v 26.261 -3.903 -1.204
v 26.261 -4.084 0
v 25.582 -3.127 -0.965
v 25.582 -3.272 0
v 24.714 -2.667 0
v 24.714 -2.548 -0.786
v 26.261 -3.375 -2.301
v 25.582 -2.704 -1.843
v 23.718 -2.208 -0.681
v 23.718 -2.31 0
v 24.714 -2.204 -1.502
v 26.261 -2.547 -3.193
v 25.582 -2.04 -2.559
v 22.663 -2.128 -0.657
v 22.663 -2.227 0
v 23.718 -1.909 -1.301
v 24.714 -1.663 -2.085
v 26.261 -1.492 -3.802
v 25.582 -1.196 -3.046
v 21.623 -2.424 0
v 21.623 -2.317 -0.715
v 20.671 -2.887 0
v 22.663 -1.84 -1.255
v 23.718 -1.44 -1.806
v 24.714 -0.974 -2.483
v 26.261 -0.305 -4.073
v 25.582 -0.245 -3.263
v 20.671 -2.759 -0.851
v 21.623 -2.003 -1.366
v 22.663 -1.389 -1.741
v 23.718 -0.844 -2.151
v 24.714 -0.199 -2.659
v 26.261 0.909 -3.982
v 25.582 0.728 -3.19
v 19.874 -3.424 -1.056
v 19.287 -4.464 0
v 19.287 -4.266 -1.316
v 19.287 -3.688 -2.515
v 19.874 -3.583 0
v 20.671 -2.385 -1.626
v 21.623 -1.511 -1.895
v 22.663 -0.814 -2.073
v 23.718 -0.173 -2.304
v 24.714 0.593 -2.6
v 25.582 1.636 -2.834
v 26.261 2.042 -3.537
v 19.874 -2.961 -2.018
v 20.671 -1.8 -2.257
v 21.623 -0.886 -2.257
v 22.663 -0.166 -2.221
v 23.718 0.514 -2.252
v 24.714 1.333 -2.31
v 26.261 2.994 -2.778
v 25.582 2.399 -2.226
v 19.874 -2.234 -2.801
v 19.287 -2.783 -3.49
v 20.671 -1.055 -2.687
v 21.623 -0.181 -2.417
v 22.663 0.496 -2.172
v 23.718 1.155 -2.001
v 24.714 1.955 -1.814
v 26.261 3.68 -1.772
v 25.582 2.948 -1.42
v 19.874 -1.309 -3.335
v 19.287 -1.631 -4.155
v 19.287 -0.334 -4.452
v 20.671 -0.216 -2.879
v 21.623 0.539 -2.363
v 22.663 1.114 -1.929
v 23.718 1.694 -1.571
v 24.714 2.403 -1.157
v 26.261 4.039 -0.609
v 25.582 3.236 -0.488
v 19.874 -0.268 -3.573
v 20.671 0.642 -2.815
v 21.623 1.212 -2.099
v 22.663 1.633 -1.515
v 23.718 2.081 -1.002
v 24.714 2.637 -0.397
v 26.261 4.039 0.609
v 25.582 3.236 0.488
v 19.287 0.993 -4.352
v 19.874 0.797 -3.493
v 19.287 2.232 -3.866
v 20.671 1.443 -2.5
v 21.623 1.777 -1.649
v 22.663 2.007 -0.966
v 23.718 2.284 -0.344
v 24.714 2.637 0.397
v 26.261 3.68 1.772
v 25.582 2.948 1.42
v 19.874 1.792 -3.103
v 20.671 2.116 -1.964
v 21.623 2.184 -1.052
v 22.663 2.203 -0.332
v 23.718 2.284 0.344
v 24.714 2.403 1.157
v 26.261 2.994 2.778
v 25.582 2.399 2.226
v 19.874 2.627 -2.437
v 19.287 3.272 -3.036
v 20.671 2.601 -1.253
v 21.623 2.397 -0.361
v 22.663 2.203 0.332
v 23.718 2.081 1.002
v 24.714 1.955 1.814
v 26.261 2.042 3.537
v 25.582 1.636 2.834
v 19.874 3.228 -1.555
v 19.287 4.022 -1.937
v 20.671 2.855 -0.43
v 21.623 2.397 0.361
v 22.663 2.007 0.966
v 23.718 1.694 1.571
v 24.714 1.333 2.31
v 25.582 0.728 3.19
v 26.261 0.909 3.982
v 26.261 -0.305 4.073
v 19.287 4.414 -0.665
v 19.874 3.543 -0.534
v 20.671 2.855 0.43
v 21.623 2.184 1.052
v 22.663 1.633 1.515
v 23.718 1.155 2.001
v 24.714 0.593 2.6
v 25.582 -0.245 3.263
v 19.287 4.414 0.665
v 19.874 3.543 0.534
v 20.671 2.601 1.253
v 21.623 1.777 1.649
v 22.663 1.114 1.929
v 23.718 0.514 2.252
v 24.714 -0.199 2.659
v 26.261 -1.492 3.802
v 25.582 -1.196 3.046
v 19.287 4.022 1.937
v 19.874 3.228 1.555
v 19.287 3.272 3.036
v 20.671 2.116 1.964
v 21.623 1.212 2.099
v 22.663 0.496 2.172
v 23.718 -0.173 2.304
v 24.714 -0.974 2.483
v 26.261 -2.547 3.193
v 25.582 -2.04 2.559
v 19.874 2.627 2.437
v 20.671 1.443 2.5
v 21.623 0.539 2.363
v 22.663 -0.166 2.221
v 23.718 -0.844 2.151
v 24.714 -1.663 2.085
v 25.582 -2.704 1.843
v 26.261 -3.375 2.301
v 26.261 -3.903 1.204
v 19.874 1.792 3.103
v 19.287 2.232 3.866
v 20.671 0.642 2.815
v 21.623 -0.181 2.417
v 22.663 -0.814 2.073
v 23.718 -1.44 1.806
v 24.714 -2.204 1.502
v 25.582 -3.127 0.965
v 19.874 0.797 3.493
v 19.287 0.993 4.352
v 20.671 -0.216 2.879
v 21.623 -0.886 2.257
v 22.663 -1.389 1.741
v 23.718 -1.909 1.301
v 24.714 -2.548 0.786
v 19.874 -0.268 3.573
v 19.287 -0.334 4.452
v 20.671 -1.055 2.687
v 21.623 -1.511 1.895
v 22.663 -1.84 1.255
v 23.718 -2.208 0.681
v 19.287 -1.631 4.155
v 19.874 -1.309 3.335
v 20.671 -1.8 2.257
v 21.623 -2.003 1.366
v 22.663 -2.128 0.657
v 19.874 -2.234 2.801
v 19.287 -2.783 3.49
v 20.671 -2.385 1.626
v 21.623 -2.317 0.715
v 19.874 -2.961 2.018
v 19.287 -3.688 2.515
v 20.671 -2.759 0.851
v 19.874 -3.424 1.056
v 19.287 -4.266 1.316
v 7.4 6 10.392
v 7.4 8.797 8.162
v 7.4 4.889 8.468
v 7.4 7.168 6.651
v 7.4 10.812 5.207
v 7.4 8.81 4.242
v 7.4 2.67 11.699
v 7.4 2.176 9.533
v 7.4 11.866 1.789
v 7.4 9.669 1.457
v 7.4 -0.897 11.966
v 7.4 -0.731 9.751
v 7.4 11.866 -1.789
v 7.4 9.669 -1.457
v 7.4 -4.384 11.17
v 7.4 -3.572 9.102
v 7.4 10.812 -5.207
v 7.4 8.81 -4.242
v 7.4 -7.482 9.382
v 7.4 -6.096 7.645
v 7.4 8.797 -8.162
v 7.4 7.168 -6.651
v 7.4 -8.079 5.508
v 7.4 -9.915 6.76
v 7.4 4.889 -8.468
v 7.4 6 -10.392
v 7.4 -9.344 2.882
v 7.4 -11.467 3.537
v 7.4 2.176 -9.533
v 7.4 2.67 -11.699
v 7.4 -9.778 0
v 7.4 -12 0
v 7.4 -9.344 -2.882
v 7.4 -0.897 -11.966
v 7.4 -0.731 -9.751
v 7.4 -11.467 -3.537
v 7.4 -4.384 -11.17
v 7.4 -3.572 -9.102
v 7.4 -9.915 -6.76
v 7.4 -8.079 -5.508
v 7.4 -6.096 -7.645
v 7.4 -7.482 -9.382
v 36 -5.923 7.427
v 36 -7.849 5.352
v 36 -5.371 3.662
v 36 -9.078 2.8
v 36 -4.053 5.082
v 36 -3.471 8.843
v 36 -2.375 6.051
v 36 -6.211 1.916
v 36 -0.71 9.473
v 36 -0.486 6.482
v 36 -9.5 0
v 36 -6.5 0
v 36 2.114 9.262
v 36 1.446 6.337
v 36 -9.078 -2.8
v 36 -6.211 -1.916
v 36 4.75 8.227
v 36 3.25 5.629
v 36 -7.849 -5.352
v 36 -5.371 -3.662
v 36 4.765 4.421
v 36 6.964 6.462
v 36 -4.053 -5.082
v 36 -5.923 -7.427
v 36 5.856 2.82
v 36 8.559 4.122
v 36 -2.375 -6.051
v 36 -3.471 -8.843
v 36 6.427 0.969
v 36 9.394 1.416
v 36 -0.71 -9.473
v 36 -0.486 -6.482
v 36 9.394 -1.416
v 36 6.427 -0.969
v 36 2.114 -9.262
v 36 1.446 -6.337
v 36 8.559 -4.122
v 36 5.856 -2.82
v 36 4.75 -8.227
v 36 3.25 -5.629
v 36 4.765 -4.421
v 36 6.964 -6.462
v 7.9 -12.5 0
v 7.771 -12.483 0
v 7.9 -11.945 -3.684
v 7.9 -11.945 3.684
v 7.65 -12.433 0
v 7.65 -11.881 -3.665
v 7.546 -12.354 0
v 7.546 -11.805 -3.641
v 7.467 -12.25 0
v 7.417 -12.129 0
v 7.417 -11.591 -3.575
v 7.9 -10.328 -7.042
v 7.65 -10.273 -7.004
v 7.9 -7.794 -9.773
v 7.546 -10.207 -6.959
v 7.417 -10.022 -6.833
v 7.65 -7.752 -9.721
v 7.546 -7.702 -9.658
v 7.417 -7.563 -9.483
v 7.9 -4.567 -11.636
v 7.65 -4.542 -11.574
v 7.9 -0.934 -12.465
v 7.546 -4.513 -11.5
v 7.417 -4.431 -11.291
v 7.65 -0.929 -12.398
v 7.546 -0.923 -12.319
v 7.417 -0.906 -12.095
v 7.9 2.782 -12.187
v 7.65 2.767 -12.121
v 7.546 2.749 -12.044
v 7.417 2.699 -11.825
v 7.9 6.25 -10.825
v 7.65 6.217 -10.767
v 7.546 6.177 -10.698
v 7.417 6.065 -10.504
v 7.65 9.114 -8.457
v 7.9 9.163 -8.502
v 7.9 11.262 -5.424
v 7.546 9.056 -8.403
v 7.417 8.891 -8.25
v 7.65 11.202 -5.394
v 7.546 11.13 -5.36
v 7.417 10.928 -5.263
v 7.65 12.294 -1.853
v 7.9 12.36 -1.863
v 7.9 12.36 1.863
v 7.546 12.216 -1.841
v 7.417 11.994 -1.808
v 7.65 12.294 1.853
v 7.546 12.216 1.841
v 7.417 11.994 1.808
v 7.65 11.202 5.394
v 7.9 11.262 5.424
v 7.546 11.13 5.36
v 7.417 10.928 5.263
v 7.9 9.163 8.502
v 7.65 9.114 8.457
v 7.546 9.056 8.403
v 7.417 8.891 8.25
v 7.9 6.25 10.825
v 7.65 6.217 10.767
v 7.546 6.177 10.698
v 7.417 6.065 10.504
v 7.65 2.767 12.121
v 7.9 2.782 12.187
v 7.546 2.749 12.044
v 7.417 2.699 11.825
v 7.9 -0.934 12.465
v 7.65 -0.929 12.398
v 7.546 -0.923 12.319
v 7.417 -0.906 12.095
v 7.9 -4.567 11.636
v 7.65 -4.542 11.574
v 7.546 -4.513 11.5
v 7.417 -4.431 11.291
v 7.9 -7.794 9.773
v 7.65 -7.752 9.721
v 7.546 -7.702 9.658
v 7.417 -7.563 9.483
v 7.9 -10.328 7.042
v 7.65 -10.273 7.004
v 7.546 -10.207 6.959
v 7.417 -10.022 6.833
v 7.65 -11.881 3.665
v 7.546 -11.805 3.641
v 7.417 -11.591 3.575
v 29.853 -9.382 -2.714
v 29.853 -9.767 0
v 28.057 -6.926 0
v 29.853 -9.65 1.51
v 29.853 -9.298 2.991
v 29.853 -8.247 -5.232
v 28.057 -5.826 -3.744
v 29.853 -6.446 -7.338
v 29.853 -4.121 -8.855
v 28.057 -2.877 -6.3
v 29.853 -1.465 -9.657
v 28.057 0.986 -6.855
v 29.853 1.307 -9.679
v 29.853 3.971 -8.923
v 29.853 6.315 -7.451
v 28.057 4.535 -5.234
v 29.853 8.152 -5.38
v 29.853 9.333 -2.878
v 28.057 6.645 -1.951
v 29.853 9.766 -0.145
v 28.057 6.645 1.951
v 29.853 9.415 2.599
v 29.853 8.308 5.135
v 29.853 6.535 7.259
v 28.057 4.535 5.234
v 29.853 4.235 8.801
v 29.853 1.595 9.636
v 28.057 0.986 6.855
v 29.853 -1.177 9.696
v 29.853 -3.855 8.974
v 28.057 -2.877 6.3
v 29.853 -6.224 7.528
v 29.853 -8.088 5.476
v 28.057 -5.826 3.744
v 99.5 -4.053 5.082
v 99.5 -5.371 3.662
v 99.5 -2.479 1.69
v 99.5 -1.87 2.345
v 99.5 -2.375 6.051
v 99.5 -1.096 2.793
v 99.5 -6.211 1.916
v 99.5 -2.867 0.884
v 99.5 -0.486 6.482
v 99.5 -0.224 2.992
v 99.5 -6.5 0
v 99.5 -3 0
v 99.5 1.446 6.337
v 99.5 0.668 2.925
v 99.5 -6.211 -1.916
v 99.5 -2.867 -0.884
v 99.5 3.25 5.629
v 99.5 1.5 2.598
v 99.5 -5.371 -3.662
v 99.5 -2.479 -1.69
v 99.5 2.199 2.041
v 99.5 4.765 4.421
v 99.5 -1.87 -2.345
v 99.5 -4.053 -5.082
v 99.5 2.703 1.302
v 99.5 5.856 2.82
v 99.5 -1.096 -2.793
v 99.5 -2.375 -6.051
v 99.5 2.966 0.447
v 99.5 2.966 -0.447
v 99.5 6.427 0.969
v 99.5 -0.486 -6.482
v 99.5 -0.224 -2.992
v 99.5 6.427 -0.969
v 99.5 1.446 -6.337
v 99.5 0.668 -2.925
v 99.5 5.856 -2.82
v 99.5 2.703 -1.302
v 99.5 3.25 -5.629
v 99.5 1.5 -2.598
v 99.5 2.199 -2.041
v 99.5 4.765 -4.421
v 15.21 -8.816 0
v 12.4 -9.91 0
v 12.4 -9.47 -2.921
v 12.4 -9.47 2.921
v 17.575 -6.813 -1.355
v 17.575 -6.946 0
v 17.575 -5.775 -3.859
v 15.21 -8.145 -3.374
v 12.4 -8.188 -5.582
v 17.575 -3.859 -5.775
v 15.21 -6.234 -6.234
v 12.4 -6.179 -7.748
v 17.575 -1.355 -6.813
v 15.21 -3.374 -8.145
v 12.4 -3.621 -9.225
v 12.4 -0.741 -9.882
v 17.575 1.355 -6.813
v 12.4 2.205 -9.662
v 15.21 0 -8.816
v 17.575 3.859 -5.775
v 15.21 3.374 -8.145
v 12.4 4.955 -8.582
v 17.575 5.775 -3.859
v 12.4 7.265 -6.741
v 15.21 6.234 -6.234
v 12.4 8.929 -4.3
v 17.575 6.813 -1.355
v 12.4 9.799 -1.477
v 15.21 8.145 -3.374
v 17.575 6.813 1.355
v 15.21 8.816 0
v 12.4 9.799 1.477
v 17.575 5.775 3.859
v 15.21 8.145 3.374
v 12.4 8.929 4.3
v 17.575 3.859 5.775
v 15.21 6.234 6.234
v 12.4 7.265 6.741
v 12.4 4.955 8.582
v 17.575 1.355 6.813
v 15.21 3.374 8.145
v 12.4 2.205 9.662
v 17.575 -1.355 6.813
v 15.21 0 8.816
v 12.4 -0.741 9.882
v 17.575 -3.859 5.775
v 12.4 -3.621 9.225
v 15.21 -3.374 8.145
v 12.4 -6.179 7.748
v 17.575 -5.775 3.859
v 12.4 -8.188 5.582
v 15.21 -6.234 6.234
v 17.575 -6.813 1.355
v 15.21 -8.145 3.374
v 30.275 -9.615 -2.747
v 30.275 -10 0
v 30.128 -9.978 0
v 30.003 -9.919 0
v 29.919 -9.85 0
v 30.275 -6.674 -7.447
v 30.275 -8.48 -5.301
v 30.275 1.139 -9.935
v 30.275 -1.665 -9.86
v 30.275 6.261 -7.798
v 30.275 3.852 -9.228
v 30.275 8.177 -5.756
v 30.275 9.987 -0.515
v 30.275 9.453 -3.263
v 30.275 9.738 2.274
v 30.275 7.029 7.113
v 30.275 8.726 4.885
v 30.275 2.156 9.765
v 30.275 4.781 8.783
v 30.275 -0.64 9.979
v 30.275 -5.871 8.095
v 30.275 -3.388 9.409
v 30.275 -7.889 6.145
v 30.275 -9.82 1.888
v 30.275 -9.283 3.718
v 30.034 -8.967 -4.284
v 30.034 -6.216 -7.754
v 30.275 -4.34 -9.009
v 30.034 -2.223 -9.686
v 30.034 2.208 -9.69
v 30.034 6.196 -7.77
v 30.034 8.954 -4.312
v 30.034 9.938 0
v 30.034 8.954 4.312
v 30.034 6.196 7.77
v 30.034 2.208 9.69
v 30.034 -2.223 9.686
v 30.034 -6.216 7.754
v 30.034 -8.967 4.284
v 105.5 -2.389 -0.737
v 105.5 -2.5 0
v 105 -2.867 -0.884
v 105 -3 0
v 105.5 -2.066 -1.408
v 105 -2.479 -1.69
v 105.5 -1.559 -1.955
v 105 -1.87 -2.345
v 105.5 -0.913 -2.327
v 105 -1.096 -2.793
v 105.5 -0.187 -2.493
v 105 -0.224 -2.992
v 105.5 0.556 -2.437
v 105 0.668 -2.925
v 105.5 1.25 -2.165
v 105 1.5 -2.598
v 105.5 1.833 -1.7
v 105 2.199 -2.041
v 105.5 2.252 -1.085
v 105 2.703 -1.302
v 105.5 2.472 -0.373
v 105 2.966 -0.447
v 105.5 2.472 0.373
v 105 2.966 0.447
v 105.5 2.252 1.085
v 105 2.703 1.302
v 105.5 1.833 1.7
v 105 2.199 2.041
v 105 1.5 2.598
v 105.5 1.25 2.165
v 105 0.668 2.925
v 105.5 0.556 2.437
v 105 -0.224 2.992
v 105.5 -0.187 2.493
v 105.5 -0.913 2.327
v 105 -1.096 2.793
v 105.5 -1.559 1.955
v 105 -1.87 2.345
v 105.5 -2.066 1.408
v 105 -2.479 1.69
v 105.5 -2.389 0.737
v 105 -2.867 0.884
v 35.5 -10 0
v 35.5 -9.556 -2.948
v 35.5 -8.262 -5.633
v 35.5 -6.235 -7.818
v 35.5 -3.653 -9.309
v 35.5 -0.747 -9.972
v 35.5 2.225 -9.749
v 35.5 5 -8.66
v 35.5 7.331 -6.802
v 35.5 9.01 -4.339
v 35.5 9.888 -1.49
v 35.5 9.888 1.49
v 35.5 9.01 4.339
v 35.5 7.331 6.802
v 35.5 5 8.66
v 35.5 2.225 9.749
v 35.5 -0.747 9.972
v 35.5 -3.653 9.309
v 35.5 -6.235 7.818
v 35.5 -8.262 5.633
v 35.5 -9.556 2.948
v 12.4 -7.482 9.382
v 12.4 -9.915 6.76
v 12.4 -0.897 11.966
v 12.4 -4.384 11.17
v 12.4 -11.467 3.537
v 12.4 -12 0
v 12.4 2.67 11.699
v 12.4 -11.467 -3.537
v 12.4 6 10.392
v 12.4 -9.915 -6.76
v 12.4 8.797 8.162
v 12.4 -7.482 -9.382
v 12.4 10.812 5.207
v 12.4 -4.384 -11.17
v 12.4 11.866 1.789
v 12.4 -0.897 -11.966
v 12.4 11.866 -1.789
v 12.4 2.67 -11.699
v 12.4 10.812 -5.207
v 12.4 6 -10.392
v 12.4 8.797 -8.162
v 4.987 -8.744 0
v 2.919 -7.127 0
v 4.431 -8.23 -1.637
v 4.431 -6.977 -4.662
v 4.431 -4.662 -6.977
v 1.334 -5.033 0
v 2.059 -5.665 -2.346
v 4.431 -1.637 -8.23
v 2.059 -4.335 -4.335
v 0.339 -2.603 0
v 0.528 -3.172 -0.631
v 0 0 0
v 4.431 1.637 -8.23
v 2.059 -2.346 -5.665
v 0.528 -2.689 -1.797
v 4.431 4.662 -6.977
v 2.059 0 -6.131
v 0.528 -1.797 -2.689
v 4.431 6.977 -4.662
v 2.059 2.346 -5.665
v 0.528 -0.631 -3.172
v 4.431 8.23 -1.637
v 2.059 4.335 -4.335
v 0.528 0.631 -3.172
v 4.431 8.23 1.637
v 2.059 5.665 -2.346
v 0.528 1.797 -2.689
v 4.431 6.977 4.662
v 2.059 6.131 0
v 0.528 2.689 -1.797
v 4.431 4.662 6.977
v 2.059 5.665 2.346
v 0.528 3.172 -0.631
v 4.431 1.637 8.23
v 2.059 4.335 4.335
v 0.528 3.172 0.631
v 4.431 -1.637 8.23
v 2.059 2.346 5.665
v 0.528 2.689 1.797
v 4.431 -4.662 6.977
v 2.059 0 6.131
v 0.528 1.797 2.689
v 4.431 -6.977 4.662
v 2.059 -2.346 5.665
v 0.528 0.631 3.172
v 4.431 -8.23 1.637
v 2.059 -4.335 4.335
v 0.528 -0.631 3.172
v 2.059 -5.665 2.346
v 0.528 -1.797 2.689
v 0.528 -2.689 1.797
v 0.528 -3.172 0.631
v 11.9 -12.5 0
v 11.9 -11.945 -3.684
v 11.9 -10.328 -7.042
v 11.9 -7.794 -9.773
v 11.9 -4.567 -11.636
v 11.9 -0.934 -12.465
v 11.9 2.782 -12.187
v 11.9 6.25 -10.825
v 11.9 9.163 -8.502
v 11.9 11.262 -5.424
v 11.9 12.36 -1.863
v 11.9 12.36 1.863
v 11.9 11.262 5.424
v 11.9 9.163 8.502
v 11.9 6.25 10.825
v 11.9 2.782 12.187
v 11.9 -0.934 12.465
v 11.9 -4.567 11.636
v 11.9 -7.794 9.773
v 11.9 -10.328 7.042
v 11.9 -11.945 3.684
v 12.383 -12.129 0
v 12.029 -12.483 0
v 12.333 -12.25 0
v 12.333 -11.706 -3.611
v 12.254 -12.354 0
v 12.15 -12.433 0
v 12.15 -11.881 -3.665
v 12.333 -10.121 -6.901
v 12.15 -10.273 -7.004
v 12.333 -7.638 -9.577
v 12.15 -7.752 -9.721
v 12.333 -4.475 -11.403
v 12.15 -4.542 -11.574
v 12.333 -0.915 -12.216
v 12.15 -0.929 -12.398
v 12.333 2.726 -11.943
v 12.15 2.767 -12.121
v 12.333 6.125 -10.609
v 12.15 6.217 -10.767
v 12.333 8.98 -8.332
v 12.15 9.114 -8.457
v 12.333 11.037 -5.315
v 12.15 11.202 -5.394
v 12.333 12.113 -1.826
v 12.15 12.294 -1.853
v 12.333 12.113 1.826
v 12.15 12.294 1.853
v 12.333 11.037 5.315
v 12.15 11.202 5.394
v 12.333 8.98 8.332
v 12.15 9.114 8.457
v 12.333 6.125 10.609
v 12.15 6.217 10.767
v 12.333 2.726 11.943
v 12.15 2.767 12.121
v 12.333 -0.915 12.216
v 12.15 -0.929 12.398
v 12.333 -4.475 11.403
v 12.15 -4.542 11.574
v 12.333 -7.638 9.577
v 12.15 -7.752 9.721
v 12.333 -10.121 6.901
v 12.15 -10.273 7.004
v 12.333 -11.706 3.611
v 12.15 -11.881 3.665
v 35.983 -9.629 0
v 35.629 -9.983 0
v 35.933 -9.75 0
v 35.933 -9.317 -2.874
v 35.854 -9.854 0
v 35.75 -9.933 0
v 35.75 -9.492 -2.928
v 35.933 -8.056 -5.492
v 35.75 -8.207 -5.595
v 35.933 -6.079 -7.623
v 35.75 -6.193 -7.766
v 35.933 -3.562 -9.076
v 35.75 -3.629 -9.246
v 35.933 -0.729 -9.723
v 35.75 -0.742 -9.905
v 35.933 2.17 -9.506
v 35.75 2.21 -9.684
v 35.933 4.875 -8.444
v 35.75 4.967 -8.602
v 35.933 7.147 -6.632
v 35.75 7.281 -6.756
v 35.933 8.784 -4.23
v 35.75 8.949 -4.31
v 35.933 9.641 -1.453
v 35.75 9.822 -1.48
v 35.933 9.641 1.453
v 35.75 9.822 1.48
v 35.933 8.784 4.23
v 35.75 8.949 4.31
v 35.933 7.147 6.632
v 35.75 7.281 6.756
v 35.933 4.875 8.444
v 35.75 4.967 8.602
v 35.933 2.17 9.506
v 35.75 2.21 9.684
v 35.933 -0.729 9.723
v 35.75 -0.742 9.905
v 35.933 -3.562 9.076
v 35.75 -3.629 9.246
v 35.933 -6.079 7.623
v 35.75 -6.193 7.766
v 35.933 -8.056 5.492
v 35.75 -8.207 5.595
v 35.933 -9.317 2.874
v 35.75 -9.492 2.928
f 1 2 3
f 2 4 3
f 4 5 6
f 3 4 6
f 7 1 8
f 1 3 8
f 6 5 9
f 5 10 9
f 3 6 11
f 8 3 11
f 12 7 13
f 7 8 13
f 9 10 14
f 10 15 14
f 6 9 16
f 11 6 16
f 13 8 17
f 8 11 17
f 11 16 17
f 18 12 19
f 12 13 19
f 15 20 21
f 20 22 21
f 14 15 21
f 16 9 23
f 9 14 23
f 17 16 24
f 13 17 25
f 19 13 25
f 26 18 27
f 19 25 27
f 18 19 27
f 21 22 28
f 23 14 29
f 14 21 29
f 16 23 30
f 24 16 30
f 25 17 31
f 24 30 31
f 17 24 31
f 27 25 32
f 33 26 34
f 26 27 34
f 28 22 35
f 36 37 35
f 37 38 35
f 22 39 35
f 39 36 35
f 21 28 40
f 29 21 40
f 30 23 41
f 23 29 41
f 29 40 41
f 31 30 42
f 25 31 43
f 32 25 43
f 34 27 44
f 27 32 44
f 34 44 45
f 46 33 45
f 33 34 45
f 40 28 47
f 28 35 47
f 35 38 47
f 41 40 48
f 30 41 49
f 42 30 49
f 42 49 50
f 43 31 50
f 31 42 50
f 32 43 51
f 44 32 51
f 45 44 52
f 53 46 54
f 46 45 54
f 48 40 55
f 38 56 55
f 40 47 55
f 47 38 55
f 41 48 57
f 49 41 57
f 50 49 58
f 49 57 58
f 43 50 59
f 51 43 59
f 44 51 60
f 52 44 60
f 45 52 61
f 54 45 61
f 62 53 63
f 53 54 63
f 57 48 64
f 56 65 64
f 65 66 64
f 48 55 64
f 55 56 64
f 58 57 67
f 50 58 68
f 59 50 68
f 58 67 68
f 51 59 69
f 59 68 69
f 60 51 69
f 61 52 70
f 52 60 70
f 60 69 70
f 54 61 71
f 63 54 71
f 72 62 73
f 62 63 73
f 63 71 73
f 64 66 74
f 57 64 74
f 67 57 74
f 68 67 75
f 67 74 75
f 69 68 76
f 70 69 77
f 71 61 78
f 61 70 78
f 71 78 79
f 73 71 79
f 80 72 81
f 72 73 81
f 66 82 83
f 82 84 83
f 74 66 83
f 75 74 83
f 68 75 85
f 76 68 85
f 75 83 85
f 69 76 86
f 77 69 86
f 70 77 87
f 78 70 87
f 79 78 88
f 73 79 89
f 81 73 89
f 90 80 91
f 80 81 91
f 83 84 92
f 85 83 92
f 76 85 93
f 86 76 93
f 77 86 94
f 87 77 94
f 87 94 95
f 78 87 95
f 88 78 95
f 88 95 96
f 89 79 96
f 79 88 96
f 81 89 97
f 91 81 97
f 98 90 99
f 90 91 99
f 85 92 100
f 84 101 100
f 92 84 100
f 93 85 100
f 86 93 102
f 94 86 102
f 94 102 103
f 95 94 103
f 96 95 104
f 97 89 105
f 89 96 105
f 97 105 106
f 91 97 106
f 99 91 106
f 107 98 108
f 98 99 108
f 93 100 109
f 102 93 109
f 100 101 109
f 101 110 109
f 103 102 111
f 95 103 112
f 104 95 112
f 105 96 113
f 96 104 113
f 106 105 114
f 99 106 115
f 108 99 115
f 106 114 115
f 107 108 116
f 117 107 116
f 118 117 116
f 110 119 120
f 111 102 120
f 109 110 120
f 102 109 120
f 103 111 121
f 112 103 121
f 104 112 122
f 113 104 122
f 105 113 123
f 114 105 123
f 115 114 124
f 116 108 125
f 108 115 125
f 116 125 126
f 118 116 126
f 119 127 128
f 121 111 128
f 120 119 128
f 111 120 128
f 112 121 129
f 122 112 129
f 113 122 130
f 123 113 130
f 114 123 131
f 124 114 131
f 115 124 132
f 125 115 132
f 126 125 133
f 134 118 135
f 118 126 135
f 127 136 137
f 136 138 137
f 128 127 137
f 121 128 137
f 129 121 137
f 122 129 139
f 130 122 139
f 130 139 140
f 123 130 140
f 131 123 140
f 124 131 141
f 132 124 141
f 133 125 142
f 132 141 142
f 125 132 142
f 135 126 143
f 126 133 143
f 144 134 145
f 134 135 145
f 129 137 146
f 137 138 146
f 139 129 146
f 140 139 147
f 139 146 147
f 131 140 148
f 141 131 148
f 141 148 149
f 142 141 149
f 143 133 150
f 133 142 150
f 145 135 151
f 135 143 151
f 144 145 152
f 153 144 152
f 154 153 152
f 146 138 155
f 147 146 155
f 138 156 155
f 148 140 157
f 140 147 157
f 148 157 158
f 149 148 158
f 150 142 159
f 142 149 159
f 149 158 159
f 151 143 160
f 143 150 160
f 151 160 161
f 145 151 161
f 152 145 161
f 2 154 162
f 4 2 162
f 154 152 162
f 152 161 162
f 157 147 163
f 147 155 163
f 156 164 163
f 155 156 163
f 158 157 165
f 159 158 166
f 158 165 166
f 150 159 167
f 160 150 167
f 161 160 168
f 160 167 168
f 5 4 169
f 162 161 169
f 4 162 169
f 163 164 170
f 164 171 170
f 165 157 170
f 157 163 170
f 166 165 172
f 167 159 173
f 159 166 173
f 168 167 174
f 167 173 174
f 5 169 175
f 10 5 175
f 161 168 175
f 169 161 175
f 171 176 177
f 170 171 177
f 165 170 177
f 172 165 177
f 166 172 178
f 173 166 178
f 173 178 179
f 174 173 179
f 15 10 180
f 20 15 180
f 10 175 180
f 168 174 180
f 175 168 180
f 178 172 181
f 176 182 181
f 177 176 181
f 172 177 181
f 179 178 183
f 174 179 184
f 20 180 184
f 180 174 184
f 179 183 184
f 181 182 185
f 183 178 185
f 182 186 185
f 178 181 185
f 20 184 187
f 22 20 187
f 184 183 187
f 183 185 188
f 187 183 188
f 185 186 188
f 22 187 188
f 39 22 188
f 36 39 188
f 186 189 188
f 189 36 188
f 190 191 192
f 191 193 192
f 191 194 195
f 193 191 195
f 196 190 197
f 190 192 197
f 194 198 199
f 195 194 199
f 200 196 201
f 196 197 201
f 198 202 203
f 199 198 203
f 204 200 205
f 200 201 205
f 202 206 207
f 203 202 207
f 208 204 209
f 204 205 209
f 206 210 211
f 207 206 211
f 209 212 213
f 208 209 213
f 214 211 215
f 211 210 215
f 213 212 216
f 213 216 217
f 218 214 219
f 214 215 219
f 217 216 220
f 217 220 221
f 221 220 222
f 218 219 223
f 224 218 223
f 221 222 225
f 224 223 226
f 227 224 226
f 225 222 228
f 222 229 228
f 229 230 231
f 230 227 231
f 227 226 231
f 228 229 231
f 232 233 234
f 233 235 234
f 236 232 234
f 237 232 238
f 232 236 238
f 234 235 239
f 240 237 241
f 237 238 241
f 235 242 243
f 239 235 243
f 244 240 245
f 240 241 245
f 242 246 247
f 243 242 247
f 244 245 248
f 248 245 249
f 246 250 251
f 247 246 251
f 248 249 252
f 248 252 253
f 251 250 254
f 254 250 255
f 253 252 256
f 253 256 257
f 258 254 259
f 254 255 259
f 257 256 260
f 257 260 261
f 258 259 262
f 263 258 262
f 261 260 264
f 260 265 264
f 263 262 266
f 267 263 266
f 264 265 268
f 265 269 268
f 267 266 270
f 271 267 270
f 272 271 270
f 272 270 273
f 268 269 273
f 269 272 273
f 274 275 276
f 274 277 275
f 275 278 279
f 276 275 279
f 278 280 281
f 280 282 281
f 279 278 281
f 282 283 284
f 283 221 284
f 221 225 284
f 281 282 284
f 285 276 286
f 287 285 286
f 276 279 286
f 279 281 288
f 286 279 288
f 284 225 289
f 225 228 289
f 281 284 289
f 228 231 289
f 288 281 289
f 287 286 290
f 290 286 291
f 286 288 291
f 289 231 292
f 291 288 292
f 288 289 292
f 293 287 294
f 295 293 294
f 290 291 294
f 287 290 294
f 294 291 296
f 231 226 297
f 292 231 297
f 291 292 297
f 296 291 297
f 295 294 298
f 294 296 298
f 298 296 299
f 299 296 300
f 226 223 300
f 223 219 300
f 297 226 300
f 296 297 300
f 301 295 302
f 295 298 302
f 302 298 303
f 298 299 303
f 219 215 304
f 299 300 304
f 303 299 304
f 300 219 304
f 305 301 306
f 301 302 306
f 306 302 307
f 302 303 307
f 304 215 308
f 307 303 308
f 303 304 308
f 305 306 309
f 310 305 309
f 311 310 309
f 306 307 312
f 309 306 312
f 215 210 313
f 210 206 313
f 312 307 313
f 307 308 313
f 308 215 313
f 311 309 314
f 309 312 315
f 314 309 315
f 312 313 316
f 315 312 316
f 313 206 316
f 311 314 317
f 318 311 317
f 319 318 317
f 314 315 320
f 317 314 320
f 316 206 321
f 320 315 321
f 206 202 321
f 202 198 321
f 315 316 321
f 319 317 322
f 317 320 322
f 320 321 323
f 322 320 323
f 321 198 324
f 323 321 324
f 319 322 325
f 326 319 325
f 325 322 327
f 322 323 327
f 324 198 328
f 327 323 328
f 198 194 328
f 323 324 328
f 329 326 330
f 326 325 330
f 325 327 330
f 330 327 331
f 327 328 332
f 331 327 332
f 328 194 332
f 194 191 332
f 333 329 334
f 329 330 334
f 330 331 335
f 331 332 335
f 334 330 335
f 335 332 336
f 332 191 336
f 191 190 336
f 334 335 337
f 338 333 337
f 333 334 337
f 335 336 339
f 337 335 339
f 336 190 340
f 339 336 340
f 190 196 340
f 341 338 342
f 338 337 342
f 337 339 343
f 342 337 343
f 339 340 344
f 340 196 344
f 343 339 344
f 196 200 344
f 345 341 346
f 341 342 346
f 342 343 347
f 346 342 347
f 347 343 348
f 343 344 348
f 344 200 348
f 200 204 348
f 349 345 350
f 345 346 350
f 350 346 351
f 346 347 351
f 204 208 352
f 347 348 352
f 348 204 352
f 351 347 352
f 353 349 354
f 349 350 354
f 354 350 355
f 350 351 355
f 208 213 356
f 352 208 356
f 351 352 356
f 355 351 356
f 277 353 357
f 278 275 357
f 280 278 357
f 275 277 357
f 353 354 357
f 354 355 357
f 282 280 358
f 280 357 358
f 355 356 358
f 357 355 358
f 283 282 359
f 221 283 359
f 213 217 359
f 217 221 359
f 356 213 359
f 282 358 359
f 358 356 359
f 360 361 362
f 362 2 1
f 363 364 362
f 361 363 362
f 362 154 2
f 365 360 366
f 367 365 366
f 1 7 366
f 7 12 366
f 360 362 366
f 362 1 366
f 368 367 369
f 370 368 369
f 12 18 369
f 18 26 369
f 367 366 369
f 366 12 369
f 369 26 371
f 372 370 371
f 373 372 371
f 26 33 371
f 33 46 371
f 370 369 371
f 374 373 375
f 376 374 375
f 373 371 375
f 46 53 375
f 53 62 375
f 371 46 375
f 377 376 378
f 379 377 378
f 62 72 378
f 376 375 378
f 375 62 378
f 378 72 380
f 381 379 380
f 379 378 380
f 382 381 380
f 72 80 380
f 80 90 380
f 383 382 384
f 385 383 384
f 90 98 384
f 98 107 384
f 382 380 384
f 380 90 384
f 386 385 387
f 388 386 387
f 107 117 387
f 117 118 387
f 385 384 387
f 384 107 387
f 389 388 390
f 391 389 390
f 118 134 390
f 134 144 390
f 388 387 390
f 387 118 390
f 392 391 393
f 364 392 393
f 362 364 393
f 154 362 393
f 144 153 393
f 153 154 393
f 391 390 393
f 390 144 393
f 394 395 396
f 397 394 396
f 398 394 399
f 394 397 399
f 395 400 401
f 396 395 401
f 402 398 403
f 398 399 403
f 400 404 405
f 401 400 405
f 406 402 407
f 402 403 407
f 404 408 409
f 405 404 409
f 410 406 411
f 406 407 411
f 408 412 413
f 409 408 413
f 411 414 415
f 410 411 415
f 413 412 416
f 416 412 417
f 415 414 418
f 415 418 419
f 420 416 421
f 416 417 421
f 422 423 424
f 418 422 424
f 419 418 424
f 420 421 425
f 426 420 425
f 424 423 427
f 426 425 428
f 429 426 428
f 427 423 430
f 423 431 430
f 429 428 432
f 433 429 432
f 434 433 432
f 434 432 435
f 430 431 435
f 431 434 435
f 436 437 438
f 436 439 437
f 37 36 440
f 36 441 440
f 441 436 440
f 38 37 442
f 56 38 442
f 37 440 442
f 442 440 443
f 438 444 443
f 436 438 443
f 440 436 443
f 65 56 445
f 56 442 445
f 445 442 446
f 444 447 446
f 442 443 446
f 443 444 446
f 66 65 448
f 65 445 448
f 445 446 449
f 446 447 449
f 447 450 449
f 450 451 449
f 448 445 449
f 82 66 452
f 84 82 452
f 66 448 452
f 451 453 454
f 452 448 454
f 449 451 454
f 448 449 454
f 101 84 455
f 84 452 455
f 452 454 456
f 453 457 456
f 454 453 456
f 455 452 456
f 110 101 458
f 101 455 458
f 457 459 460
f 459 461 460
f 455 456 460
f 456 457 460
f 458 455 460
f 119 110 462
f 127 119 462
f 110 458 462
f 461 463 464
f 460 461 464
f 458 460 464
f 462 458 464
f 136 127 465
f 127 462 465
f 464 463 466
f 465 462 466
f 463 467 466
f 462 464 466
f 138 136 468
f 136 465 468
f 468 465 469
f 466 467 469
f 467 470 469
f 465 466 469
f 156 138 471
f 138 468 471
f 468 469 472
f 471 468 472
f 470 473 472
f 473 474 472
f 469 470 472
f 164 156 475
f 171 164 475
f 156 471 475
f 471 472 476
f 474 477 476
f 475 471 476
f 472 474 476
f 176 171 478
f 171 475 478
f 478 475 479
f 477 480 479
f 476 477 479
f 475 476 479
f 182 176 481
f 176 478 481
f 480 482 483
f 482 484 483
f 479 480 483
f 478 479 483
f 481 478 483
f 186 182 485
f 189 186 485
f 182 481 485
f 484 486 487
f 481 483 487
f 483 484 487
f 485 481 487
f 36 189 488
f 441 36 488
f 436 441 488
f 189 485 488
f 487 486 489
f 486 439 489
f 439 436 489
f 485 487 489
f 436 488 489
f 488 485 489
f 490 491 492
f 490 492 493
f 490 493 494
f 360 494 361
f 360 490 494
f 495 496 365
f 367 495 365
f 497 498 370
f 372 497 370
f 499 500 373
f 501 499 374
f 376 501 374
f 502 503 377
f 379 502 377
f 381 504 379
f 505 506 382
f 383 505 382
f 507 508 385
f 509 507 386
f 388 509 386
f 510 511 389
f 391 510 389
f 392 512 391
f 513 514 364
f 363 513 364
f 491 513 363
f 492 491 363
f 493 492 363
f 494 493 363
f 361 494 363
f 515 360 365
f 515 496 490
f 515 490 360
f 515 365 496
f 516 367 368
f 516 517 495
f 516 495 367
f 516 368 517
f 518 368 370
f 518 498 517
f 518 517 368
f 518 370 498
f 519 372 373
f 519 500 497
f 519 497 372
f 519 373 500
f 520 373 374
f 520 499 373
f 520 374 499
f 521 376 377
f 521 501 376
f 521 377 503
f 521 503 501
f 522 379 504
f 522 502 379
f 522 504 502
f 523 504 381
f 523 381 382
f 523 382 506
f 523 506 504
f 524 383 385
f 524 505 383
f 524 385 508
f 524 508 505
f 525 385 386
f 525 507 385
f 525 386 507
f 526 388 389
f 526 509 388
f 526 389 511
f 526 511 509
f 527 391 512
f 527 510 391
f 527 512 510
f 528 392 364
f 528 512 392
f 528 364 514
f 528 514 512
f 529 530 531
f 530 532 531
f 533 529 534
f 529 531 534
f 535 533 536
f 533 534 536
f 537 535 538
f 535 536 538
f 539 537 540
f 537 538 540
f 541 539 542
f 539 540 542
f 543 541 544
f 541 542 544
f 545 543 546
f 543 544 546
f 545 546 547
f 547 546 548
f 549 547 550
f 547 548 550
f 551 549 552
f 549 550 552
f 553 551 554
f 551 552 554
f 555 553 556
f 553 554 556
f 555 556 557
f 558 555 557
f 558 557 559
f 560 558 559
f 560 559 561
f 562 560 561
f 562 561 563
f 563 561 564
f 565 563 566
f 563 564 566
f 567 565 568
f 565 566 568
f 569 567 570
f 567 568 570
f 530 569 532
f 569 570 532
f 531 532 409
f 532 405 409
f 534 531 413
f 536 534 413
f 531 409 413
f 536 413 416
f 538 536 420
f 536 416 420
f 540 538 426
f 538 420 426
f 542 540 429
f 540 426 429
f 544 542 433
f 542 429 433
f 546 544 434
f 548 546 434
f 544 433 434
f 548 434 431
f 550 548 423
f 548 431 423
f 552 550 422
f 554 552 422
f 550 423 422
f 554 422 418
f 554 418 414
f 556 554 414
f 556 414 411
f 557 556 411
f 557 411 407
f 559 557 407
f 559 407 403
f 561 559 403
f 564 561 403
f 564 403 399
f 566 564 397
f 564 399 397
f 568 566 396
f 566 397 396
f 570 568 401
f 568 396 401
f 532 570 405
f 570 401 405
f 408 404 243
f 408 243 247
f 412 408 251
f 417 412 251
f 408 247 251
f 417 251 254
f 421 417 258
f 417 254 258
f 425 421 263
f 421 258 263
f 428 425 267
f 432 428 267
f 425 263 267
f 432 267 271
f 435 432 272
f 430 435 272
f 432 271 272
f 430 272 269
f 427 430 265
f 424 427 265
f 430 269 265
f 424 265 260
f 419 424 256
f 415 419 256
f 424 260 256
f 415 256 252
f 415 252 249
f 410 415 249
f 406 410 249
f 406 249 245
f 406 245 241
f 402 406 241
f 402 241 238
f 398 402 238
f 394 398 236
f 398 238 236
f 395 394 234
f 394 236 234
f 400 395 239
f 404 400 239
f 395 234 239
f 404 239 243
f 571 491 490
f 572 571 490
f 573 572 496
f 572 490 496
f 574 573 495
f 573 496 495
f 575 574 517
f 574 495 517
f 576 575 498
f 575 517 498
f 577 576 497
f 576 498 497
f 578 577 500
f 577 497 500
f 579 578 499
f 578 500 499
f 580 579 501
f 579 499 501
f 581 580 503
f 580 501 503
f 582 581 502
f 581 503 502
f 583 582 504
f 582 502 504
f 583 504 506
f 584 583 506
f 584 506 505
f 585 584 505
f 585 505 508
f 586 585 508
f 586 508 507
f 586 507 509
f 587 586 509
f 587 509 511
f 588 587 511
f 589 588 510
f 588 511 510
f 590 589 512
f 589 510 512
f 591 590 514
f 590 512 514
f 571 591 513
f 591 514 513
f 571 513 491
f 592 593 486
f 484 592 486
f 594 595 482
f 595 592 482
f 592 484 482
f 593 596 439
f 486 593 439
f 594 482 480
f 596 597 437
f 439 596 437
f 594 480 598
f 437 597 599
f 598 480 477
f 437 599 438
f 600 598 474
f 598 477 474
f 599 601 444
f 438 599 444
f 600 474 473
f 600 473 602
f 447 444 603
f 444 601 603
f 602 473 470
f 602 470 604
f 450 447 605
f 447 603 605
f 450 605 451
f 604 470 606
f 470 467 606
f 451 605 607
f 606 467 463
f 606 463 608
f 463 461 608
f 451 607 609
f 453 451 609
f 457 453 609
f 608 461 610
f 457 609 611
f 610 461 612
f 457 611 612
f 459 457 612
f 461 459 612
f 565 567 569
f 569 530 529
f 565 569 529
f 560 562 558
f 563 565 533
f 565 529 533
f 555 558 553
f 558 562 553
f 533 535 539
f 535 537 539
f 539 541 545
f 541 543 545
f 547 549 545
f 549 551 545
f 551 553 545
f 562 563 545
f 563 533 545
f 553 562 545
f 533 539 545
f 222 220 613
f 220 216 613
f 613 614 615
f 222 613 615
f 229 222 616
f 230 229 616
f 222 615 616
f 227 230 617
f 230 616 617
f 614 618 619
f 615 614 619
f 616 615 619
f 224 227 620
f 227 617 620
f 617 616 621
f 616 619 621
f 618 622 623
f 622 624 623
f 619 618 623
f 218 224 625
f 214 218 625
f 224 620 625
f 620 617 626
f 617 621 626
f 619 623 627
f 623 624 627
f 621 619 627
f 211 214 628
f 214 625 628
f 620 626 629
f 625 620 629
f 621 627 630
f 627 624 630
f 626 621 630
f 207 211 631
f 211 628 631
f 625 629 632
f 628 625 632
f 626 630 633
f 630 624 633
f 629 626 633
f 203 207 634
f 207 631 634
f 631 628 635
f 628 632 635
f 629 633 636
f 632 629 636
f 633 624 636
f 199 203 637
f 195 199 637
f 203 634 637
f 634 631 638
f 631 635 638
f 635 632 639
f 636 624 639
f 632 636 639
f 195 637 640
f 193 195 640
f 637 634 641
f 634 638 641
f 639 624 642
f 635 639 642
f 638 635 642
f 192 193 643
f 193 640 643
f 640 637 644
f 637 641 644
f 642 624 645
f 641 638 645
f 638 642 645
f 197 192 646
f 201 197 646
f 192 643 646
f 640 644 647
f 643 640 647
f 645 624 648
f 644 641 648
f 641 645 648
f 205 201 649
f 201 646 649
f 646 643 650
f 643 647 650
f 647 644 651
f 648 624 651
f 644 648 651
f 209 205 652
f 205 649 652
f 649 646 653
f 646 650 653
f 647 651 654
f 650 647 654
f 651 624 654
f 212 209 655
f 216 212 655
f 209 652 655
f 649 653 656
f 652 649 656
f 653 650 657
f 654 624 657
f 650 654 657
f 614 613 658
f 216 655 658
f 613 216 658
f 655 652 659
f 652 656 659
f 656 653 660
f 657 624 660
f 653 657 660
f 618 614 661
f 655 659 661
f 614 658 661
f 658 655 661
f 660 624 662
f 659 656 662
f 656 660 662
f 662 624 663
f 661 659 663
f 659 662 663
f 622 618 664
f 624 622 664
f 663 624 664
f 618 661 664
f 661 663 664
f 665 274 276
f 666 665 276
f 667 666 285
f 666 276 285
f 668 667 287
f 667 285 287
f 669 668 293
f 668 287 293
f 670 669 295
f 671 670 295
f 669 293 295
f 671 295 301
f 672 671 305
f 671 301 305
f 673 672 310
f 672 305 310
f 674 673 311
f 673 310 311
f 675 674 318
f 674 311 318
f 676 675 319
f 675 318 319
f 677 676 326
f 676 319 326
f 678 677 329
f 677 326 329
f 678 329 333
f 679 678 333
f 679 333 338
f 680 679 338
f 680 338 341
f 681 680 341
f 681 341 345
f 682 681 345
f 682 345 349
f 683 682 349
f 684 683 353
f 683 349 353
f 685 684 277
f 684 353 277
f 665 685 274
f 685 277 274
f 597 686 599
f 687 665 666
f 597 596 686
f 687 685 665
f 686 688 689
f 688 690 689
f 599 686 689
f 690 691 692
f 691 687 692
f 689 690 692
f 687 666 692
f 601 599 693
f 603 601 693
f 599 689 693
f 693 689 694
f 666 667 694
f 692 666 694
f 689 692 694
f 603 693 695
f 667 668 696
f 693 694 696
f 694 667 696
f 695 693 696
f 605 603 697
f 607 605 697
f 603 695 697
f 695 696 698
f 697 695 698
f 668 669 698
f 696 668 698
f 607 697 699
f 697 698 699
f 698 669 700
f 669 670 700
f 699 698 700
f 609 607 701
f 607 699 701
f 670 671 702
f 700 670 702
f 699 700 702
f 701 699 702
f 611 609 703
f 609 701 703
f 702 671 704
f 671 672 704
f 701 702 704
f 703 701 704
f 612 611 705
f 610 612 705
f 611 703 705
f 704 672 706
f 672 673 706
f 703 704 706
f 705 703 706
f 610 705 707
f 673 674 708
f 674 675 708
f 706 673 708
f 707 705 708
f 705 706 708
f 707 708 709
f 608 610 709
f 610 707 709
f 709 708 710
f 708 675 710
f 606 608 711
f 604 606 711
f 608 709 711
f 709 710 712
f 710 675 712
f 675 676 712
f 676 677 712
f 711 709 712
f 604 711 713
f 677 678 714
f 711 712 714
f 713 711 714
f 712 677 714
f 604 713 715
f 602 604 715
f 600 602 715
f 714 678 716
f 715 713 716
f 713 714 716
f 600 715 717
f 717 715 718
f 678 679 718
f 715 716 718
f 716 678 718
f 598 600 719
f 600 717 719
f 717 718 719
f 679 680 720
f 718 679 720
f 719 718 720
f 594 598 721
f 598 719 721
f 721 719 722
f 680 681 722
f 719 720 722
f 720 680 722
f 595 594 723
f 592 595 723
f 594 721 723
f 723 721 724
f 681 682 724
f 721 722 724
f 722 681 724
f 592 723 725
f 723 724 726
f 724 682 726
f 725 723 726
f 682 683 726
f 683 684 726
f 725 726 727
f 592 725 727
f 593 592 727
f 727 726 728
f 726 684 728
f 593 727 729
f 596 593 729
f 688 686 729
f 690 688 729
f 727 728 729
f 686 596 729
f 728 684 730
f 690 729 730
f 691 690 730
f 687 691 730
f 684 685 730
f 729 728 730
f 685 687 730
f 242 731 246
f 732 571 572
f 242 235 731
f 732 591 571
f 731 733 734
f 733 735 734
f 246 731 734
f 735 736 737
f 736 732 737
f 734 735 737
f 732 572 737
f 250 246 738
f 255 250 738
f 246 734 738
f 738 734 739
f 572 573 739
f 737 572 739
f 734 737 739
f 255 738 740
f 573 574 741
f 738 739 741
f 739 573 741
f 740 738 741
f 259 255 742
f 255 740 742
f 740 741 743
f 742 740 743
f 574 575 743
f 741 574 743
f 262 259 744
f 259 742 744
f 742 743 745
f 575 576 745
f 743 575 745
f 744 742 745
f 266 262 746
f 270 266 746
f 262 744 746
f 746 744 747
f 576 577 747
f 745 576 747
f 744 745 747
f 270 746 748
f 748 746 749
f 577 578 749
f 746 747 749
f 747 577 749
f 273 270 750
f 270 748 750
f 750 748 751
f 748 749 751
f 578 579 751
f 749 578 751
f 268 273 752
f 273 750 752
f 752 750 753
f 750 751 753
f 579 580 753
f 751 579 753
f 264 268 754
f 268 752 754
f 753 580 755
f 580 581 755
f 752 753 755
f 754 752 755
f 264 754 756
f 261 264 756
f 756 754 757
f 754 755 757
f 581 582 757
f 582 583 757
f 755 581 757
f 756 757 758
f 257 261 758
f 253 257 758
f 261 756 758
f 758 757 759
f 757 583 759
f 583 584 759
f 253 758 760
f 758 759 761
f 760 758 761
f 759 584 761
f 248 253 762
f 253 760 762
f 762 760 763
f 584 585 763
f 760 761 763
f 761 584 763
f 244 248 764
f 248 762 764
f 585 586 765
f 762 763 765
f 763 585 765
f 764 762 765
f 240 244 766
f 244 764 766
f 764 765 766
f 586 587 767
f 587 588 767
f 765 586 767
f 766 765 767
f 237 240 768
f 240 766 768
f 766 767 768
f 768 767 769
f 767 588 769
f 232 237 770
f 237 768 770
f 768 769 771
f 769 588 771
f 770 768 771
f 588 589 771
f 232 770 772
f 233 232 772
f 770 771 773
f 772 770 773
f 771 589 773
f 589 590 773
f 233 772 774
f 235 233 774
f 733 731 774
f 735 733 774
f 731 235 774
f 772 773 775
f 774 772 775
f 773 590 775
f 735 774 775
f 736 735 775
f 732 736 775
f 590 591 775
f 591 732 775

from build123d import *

# Parameters (mm, degrees)
FILLET1_R = 0.5


with BuildPart() as part:
    # Sketch1 → Revolve1 (revolve)
    with BuildSketch(Plane.XY, mode=Mode.PRIVATE) as revolve1_sk:
        with BuildLine():
            Line((0, 0), (105.5, 0))
            Line((105.5, 0), (105.5, 2.5))
            Line((105.5, 2.5), (105, 3))
            Line((105, 3), (99.5, 3))
            Line((99.5, 3), (99.5, 6.5))
            Line((99.5, 6.5), (36, 6.5))
            Line((36, 6.5), (36, 10))
            Line((36, 10), (30, 10))
            Line((30, 10), (26.261285599, 4.084478618))
            ThreePointArc((26.261285599, 4.084478618), (22.662646852, 2.227420735), (19.286779661, 4.464022068))
            ThreePointArc((19.286779661, 4.464022068), (16.462029446, 7.969317716), (12.4, 9.909994955))
            Line((12.4, 9.909994955), (12.4, 12.5))
            Line((12.4, 12.5), (7.4, 12.5))
            Line((7.4, 12.5), (7.4, 9.777934342))
            ThreePointArc((7.4, 9.777934342), (2.058543341, 6.131231524), (0, 0))
        make_face()
    revolve(revolve1_sk.sketch.rotate(Axis((0, 0, 0), (1, 0, 0)), 180), axis=Axis((0, 0, 0), (1, 0, 0)))

    # Fillet1
    fillet1_edges = [part.edges().sort_by_distance(p)[0] for p in [
        (7.4, 12.5, 0),
        (12.4, 12.5, 0),
        (30, 10, 0),
        (36, 10, 0),
    ]]
    fillet(fillet1_edges, radius=FILLET1_R)


solid = part.part
